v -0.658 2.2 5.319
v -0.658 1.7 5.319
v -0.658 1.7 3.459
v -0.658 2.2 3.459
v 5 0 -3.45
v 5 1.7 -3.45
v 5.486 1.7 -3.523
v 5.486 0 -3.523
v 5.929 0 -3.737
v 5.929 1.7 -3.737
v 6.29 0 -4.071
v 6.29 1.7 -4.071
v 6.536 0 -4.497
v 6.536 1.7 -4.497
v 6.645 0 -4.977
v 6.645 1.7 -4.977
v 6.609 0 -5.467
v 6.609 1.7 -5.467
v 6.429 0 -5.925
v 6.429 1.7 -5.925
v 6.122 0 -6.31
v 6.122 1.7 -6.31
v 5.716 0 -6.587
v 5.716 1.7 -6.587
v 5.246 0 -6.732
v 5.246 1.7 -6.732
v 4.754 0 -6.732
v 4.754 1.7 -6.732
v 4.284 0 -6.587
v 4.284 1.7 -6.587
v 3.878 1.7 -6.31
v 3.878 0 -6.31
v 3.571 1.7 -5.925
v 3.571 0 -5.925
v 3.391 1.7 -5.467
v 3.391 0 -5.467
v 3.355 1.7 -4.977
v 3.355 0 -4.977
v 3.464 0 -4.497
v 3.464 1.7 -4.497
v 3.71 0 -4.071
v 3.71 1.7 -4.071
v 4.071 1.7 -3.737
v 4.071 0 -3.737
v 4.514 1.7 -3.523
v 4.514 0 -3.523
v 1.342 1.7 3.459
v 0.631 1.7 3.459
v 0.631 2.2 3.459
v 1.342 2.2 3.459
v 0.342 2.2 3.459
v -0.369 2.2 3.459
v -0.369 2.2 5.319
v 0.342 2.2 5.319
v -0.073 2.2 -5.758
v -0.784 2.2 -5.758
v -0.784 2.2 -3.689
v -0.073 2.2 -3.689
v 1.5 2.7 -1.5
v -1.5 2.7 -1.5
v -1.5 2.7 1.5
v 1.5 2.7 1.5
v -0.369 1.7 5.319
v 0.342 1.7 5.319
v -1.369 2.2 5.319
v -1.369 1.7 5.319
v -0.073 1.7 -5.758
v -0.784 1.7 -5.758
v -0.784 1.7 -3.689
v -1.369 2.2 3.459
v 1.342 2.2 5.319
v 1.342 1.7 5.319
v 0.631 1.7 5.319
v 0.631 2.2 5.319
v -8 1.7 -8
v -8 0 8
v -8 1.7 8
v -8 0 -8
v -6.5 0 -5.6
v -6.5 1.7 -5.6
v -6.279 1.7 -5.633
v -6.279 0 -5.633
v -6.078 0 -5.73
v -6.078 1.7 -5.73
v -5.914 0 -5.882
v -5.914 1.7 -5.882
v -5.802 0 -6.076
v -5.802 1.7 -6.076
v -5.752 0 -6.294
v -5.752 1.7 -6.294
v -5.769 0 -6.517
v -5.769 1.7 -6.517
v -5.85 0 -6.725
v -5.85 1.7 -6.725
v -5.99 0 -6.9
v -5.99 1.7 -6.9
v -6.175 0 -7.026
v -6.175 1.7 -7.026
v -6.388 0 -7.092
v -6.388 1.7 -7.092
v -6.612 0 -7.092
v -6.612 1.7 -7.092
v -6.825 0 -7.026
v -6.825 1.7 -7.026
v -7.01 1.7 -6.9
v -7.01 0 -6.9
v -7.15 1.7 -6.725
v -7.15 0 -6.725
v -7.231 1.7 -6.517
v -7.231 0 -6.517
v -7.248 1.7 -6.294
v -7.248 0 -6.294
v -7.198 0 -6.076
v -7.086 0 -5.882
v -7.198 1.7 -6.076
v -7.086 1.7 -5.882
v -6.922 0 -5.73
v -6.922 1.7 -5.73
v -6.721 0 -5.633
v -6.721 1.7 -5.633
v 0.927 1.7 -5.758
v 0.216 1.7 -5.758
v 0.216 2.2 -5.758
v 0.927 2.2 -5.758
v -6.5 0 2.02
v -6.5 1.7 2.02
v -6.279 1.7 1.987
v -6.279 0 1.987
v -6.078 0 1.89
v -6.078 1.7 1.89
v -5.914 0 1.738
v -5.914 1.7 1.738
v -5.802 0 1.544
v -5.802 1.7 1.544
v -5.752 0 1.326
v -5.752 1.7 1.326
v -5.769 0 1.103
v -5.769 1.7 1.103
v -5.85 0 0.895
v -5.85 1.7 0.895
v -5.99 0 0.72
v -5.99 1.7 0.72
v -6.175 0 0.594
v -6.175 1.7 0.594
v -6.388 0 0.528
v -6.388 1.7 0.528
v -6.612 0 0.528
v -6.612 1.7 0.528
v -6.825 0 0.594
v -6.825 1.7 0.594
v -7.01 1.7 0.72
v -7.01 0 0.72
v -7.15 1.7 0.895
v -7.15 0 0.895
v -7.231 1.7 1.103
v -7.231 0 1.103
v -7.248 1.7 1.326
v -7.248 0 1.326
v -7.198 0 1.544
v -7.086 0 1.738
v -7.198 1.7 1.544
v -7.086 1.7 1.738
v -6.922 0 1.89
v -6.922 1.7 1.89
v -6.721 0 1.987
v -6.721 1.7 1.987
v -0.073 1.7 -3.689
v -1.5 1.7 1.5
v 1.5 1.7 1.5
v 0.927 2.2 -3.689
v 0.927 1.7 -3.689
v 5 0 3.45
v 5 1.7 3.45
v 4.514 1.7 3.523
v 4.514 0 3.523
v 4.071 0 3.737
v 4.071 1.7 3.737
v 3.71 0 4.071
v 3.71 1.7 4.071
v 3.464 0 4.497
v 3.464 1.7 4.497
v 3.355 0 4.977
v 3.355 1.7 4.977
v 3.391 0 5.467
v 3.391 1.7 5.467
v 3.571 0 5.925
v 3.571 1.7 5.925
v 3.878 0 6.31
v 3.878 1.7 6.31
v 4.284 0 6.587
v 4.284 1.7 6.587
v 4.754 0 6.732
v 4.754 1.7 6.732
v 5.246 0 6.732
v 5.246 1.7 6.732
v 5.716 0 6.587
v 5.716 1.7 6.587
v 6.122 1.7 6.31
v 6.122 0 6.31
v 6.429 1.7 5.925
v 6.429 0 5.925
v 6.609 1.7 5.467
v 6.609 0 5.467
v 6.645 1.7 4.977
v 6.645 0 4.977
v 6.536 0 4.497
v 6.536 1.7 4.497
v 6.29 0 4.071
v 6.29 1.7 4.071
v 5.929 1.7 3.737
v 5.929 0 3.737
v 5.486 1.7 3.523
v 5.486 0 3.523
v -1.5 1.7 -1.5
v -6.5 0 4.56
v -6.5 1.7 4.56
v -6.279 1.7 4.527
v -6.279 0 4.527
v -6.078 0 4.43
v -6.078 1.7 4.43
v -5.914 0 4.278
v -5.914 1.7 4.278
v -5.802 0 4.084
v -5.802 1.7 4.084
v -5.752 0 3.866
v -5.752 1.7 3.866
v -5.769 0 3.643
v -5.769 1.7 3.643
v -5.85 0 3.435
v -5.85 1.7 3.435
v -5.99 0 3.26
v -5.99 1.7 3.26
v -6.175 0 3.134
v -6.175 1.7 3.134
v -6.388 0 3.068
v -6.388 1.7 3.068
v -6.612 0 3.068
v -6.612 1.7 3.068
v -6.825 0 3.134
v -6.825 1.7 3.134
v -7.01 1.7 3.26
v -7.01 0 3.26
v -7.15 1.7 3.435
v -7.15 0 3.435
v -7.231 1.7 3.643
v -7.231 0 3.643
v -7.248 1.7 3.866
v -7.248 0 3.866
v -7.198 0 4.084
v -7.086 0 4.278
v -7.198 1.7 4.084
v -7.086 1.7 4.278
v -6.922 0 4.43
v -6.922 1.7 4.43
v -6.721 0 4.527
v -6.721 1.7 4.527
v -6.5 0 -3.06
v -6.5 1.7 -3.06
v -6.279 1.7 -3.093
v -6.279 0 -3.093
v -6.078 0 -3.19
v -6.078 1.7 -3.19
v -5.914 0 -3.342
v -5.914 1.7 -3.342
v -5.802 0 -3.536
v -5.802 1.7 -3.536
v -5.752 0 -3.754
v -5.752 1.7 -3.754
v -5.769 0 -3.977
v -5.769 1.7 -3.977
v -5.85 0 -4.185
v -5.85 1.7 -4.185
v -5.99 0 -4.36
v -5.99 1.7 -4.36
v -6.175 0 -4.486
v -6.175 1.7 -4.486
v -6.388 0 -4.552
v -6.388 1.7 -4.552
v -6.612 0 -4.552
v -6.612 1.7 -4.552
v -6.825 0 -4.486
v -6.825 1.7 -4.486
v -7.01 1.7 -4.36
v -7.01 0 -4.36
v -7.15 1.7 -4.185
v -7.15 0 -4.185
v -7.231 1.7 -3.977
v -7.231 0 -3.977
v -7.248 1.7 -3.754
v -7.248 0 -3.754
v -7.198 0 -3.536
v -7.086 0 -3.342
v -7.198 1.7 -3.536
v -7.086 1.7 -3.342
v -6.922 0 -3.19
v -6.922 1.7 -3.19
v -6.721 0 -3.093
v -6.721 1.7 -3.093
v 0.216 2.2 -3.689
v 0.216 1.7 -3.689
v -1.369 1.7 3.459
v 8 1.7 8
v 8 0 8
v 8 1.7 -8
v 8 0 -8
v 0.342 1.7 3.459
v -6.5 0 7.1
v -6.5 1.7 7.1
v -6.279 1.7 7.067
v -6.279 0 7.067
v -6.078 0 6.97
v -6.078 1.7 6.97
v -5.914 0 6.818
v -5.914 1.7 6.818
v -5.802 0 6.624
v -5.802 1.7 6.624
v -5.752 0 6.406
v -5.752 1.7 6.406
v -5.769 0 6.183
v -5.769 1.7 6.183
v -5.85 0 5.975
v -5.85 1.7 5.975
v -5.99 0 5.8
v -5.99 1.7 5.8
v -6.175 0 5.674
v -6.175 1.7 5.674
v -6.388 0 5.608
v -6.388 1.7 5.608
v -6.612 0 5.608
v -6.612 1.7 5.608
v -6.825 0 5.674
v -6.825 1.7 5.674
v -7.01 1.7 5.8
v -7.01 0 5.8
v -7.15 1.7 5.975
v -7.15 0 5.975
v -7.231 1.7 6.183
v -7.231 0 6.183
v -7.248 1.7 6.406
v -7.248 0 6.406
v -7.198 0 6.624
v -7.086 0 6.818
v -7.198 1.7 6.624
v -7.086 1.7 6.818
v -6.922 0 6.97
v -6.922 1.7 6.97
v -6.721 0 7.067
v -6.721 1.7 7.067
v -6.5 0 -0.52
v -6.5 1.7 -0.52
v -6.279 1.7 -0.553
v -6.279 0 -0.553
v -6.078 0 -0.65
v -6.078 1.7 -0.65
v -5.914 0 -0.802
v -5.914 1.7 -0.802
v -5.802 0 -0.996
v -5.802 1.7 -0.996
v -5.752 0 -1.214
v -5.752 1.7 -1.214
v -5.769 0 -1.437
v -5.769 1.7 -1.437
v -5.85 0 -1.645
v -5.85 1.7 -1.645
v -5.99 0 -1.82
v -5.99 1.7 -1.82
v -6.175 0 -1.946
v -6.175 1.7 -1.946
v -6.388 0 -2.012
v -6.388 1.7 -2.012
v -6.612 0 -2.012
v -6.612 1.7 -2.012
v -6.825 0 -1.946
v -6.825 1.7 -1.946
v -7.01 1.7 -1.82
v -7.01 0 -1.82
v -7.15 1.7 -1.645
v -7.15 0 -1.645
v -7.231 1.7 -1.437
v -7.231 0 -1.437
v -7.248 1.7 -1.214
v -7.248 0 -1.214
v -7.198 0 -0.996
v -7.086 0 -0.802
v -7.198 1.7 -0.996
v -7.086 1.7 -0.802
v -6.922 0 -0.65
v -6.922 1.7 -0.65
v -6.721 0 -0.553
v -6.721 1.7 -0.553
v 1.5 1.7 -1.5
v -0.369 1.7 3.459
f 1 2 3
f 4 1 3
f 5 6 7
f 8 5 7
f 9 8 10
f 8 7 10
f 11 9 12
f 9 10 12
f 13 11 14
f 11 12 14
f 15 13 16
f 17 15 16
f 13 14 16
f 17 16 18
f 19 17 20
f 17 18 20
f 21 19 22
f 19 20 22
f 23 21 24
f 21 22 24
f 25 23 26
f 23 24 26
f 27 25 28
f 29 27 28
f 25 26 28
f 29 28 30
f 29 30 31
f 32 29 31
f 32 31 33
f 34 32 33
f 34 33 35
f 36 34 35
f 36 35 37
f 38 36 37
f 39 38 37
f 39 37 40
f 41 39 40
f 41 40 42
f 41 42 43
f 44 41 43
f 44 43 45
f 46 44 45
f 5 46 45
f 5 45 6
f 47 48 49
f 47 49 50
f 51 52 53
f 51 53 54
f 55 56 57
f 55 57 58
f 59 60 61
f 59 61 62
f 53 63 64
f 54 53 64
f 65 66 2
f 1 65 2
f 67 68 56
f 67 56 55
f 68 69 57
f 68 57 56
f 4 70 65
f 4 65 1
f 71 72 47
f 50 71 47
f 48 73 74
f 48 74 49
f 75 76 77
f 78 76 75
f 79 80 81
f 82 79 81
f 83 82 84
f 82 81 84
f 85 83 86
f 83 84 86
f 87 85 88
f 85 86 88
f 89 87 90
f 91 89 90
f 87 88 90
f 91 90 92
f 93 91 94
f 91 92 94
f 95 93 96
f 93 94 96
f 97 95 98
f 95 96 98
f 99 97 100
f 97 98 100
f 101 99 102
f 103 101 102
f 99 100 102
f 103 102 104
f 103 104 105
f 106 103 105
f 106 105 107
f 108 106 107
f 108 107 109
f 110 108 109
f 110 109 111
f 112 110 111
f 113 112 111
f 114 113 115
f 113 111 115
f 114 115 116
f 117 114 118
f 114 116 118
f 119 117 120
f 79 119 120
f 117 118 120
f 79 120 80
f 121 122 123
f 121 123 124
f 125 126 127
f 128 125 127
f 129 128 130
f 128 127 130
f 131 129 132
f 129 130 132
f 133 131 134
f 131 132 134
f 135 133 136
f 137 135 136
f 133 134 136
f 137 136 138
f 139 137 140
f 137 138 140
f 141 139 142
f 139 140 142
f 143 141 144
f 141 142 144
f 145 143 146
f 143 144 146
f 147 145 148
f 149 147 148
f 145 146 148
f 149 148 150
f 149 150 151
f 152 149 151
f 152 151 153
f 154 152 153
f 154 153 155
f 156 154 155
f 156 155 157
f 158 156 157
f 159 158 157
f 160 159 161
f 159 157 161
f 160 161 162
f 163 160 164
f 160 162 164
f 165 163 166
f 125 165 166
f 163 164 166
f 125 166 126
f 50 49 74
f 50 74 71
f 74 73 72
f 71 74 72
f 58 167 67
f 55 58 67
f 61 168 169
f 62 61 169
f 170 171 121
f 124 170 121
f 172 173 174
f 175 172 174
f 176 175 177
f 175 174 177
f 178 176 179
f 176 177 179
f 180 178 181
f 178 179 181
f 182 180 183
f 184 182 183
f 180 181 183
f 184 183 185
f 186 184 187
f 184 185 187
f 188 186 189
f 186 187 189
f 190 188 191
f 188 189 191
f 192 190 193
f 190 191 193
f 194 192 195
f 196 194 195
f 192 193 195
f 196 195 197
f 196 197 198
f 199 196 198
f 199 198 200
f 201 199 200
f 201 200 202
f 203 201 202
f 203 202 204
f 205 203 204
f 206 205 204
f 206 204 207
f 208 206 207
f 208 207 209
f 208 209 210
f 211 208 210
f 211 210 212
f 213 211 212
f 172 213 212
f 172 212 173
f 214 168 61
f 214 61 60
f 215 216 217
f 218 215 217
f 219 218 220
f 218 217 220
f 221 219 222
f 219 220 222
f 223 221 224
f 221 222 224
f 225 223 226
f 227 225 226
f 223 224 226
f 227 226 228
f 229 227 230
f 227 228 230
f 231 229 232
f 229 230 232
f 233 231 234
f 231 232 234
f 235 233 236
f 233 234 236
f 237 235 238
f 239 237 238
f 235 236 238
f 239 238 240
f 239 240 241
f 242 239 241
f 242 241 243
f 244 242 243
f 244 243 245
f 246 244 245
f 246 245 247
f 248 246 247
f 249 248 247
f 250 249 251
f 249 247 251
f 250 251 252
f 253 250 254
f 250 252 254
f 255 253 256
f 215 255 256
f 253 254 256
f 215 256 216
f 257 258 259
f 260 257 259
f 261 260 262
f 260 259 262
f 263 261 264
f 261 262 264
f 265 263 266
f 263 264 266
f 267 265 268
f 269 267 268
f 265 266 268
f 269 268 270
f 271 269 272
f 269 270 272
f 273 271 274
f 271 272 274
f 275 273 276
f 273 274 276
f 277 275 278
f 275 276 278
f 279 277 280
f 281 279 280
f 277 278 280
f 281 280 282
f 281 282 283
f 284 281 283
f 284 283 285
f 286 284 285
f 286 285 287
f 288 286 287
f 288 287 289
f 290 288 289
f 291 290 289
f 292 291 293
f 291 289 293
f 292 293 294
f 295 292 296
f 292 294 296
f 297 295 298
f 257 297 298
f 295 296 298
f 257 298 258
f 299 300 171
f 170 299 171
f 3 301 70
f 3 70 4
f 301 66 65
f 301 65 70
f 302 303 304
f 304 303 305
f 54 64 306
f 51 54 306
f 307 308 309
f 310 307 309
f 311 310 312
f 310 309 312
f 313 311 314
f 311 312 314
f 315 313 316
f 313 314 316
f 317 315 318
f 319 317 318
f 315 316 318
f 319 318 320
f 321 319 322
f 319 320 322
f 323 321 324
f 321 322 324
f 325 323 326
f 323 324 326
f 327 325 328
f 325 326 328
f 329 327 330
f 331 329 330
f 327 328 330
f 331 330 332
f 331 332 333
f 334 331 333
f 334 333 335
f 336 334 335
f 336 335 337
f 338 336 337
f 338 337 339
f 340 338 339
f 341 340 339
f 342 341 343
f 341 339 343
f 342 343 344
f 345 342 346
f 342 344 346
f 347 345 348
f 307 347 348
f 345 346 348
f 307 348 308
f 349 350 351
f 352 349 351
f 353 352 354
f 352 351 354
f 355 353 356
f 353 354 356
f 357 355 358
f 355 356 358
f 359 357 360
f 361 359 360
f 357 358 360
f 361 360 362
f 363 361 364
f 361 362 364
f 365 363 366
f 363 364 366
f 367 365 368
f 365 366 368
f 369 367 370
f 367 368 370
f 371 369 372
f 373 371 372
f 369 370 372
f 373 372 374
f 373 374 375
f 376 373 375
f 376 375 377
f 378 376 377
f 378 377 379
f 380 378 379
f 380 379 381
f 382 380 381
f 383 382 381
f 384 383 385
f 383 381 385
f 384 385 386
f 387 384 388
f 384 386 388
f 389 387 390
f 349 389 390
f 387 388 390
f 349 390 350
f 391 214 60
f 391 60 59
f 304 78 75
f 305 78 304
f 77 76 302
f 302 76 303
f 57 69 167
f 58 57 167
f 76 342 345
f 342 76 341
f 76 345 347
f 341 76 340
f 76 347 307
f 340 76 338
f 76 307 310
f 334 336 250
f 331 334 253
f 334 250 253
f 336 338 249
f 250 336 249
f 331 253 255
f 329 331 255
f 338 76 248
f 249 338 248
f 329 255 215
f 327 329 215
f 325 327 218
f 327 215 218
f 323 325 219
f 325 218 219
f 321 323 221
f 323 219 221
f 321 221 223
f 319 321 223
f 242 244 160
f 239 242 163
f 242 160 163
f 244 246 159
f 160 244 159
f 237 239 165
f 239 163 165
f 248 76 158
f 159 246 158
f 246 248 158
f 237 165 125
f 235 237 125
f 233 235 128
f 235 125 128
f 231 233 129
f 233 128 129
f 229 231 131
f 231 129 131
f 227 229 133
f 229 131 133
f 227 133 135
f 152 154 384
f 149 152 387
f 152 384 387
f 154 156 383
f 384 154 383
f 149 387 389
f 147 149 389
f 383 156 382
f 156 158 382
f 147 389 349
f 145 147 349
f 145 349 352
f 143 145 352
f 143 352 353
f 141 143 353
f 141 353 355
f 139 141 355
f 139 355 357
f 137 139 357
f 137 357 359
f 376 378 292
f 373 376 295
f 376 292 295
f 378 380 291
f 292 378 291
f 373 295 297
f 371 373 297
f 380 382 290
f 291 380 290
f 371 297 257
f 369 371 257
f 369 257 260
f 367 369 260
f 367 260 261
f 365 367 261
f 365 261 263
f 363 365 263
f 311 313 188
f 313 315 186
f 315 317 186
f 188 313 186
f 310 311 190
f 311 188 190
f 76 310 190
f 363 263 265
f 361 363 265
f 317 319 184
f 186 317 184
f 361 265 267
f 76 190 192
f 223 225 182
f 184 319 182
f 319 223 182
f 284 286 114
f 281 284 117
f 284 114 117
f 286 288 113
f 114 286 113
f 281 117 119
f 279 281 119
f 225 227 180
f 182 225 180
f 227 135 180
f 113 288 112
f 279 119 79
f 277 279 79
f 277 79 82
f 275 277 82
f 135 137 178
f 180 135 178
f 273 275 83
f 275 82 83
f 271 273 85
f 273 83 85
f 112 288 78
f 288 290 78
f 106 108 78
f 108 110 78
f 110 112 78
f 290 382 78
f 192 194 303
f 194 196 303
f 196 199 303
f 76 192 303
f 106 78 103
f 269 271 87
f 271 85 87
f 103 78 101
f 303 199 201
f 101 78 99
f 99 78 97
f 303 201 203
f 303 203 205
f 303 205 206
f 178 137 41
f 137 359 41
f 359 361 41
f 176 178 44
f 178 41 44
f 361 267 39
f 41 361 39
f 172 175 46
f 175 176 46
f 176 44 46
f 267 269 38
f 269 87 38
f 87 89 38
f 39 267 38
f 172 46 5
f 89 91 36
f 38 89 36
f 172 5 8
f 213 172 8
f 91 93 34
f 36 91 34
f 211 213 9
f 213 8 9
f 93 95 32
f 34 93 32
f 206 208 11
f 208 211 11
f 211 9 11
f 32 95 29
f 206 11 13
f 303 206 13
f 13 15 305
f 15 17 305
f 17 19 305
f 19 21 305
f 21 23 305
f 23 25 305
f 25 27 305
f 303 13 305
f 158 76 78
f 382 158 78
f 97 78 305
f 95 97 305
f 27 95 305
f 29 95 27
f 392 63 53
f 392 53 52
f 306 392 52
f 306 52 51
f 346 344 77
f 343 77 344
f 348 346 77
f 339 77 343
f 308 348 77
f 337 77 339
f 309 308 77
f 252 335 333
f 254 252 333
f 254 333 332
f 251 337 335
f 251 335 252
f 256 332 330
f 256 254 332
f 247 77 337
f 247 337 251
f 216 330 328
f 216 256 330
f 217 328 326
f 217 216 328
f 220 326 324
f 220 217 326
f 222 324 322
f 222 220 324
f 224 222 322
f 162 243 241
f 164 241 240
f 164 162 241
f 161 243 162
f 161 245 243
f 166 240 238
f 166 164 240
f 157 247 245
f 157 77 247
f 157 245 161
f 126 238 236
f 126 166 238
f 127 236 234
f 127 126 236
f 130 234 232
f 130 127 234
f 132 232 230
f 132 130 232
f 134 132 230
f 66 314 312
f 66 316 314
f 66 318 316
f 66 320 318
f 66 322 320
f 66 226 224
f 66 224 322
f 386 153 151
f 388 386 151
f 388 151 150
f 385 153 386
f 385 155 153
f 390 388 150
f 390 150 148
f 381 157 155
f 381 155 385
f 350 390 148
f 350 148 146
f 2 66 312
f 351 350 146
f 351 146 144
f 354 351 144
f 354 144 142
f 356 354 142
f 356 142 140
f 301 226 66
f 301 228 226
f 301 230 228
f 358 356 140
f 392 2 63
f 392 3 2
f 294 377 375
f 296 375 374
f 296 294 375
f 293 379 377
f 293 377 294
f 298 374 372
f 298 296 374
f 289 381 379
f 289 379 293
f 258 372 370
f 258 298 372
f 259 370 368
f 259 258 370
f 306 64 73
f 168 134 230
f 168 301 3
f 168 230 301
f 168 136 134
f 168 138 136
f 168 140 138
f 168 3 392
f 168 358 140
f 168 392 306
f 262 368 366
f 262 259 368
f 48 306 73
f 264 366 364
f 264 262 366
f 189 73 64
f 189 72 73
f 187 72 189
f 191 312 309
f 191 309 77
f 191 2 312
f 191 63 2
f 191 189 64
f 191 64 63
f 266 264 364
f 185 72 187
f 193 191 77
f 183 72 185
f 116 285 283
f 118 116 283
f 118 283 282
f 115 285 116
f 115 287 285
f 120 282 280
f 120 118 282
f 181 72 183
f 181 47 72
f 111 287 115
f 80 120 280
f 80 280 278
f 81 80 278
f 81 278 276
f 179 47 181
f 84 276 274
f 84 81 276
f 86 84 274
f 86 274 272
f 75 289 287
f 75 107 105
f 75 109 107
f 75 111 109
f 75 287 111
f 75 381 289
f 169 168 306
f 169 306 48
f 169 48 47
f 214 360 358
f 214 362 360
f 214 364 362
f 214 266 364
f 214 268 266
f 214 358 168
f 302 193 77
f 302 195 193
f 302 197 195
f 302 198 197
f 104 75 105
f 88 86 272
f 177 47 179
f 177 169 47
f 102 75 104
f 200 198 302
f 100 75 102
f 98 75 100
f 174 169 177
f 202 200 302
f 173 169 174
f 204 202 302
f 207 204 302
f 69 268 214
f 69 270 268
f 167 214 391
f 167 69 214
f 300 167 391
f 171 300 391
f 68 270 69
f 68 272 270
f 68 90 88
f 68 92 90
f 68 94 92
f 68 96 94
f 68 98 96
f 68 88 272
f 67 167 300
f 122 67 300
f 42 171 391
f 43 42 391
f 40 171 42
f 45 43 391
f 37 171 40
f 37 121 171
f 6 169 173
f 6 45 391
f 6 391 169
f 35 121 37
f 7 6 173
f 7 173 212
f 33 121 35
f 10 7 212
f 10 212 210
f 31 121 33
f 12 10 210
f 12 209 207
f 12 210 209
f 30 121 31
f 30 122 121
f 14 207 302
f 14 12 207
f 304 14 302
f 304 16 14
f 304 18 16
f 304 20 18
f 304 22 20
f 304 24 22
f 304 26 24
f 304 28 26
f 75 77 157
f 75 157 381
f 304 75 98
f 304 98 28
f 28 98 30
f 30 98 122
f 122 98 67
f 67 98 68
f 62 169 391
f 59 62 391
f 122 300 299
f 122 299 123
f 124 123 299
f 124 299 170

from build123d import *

# Parameters (mm, degrees)
SKETCH2_W           = 16
SKETCH2_H           = 16
BOSS_EXTRUDE1_DEPTH = 1.7
SKETCH3_R           = 0.75
CUT_EXTRUDE1_DEPTH  = 1.7
SKETCH4_W           = 3
SKETCH4_H           = 3
BOSS_EXTRUDE2_DEPTH = 1
SKETCH5_W           = 0.710598353
SKETCH5_H           = 2.069095202
SKETCH5_H_2         = 1.860095687
BOSS_EXTRUDE3_DEPTH = 0.5
SKETCH6_R           = 1.65
CUT_EXTRUDE2_DEPTH  = 12.440716761


with BuildPart() as part:
    # Sketch2 → Boss-Extrude1 (new body)
    with BuildSketch(Plane(origin=(0, 0, 0), x_dir=(1, 0, 0), z_dir=(0, 1, 0))):
        Rectangle(SKETCH2_W, SKETCH2_H)
    extrude(amount=BOSS_EXTRUDE1_DEPTH)

    # Sketch3 → Cut-Extrude1 (cut)
    with BuildSketch(Plane(origin=(0, 1.7, 0), x_dir=(1, 0, 0), z_dir=(0, 1, 0))):
        with Locations(Location((-6.5, 6.35, 0), (0, 0, 270))):
            Circle(SKETCH3_R)
        with Locations(Location((-6.5, 3.81, 0), (0, 0, 270))):
            Circle(SKETCH3_R)
        with Locations(Location((-6.5, 1.27, 0), (0, 0, 270))):
            Circle(SKETCH3_R)
        with Locations(Location((-6.5, -1.27, 0), (0, 0, 270))):
            Circle(SKETCH3_R)
        with Locations(Location((-6.5, -3.81, 0), (0, 0, 270))):
            Circle(SKETCH3_R)
        with Locations(Location((-6.5, -6.35, 0), (0, 0, 270))):
            Circle(SKETCH3_R)
    extrude(amount=-CUT_EXTRUDE1_DEPTH, mode=Mode.SUBTRACT)

    # Sketch4 → Boss-Extrude2 (add)
    with BuildSketch(Plane(origin=(0, 1.7, 0), x_dir=(1, 0, 0), z_dir=(0, 1, 0))):
        Rectangle(SKETCH4_W, SKETCH4_H)
    extrude(amount=BOSS_EXTRUDE2_DEPTH)

    # Sketch5 → Boss-Extrude3 (add)
    with BuildSketch(Plane(origin=(0, 1.7, 0), x_dir=(1, 0, 0), z_dir=(0, 1, 0))):
        with Locations((0.571550994, 4.723389047)):
            Rectangle(SKETCH5_W, SKETCH5_H)
        with Locations((-0.428449007, 4.723389047)):
            Rectangle(SKETCH5_W, SKETCH5_H)
        with Locations((-1.01364765, -4.388989823)):
            Rectangle(SKETCH5_W, SKETCH5_H_2)
        with Locations((-0.013647649, -4.388989823)):
            Rectangle(SKETCH5_W, SKETCH5_H_2)
        with Locations((0.986352351, -4.388989823)):
            Rectangle(SKETCH5_W, SKETCH5_H_2)
    extrude(amount=BOSS_EXTRUDE3_DEPTH)

    # Sketch6 → Cut-Extrude2 (cut, through all)
    with BuildSketch(Plane(origin=(0, 1.7, 0), x_dir=(1, 0, 0), z_dir=(0, 1, 0))):
        with Locations(Location((5, 5.1, 0), (0, 0, 270))):
            Circle(SKETCH6_R)
        with Locations(Location((5, -5.1, 0), (0, 0, 90))):
            Circle(SKETCH6_R)
    extrude(amount=-CUT_EXTRUDE2_DEPTH, mode=Mode.SUBTRACT)


solid = part.part
